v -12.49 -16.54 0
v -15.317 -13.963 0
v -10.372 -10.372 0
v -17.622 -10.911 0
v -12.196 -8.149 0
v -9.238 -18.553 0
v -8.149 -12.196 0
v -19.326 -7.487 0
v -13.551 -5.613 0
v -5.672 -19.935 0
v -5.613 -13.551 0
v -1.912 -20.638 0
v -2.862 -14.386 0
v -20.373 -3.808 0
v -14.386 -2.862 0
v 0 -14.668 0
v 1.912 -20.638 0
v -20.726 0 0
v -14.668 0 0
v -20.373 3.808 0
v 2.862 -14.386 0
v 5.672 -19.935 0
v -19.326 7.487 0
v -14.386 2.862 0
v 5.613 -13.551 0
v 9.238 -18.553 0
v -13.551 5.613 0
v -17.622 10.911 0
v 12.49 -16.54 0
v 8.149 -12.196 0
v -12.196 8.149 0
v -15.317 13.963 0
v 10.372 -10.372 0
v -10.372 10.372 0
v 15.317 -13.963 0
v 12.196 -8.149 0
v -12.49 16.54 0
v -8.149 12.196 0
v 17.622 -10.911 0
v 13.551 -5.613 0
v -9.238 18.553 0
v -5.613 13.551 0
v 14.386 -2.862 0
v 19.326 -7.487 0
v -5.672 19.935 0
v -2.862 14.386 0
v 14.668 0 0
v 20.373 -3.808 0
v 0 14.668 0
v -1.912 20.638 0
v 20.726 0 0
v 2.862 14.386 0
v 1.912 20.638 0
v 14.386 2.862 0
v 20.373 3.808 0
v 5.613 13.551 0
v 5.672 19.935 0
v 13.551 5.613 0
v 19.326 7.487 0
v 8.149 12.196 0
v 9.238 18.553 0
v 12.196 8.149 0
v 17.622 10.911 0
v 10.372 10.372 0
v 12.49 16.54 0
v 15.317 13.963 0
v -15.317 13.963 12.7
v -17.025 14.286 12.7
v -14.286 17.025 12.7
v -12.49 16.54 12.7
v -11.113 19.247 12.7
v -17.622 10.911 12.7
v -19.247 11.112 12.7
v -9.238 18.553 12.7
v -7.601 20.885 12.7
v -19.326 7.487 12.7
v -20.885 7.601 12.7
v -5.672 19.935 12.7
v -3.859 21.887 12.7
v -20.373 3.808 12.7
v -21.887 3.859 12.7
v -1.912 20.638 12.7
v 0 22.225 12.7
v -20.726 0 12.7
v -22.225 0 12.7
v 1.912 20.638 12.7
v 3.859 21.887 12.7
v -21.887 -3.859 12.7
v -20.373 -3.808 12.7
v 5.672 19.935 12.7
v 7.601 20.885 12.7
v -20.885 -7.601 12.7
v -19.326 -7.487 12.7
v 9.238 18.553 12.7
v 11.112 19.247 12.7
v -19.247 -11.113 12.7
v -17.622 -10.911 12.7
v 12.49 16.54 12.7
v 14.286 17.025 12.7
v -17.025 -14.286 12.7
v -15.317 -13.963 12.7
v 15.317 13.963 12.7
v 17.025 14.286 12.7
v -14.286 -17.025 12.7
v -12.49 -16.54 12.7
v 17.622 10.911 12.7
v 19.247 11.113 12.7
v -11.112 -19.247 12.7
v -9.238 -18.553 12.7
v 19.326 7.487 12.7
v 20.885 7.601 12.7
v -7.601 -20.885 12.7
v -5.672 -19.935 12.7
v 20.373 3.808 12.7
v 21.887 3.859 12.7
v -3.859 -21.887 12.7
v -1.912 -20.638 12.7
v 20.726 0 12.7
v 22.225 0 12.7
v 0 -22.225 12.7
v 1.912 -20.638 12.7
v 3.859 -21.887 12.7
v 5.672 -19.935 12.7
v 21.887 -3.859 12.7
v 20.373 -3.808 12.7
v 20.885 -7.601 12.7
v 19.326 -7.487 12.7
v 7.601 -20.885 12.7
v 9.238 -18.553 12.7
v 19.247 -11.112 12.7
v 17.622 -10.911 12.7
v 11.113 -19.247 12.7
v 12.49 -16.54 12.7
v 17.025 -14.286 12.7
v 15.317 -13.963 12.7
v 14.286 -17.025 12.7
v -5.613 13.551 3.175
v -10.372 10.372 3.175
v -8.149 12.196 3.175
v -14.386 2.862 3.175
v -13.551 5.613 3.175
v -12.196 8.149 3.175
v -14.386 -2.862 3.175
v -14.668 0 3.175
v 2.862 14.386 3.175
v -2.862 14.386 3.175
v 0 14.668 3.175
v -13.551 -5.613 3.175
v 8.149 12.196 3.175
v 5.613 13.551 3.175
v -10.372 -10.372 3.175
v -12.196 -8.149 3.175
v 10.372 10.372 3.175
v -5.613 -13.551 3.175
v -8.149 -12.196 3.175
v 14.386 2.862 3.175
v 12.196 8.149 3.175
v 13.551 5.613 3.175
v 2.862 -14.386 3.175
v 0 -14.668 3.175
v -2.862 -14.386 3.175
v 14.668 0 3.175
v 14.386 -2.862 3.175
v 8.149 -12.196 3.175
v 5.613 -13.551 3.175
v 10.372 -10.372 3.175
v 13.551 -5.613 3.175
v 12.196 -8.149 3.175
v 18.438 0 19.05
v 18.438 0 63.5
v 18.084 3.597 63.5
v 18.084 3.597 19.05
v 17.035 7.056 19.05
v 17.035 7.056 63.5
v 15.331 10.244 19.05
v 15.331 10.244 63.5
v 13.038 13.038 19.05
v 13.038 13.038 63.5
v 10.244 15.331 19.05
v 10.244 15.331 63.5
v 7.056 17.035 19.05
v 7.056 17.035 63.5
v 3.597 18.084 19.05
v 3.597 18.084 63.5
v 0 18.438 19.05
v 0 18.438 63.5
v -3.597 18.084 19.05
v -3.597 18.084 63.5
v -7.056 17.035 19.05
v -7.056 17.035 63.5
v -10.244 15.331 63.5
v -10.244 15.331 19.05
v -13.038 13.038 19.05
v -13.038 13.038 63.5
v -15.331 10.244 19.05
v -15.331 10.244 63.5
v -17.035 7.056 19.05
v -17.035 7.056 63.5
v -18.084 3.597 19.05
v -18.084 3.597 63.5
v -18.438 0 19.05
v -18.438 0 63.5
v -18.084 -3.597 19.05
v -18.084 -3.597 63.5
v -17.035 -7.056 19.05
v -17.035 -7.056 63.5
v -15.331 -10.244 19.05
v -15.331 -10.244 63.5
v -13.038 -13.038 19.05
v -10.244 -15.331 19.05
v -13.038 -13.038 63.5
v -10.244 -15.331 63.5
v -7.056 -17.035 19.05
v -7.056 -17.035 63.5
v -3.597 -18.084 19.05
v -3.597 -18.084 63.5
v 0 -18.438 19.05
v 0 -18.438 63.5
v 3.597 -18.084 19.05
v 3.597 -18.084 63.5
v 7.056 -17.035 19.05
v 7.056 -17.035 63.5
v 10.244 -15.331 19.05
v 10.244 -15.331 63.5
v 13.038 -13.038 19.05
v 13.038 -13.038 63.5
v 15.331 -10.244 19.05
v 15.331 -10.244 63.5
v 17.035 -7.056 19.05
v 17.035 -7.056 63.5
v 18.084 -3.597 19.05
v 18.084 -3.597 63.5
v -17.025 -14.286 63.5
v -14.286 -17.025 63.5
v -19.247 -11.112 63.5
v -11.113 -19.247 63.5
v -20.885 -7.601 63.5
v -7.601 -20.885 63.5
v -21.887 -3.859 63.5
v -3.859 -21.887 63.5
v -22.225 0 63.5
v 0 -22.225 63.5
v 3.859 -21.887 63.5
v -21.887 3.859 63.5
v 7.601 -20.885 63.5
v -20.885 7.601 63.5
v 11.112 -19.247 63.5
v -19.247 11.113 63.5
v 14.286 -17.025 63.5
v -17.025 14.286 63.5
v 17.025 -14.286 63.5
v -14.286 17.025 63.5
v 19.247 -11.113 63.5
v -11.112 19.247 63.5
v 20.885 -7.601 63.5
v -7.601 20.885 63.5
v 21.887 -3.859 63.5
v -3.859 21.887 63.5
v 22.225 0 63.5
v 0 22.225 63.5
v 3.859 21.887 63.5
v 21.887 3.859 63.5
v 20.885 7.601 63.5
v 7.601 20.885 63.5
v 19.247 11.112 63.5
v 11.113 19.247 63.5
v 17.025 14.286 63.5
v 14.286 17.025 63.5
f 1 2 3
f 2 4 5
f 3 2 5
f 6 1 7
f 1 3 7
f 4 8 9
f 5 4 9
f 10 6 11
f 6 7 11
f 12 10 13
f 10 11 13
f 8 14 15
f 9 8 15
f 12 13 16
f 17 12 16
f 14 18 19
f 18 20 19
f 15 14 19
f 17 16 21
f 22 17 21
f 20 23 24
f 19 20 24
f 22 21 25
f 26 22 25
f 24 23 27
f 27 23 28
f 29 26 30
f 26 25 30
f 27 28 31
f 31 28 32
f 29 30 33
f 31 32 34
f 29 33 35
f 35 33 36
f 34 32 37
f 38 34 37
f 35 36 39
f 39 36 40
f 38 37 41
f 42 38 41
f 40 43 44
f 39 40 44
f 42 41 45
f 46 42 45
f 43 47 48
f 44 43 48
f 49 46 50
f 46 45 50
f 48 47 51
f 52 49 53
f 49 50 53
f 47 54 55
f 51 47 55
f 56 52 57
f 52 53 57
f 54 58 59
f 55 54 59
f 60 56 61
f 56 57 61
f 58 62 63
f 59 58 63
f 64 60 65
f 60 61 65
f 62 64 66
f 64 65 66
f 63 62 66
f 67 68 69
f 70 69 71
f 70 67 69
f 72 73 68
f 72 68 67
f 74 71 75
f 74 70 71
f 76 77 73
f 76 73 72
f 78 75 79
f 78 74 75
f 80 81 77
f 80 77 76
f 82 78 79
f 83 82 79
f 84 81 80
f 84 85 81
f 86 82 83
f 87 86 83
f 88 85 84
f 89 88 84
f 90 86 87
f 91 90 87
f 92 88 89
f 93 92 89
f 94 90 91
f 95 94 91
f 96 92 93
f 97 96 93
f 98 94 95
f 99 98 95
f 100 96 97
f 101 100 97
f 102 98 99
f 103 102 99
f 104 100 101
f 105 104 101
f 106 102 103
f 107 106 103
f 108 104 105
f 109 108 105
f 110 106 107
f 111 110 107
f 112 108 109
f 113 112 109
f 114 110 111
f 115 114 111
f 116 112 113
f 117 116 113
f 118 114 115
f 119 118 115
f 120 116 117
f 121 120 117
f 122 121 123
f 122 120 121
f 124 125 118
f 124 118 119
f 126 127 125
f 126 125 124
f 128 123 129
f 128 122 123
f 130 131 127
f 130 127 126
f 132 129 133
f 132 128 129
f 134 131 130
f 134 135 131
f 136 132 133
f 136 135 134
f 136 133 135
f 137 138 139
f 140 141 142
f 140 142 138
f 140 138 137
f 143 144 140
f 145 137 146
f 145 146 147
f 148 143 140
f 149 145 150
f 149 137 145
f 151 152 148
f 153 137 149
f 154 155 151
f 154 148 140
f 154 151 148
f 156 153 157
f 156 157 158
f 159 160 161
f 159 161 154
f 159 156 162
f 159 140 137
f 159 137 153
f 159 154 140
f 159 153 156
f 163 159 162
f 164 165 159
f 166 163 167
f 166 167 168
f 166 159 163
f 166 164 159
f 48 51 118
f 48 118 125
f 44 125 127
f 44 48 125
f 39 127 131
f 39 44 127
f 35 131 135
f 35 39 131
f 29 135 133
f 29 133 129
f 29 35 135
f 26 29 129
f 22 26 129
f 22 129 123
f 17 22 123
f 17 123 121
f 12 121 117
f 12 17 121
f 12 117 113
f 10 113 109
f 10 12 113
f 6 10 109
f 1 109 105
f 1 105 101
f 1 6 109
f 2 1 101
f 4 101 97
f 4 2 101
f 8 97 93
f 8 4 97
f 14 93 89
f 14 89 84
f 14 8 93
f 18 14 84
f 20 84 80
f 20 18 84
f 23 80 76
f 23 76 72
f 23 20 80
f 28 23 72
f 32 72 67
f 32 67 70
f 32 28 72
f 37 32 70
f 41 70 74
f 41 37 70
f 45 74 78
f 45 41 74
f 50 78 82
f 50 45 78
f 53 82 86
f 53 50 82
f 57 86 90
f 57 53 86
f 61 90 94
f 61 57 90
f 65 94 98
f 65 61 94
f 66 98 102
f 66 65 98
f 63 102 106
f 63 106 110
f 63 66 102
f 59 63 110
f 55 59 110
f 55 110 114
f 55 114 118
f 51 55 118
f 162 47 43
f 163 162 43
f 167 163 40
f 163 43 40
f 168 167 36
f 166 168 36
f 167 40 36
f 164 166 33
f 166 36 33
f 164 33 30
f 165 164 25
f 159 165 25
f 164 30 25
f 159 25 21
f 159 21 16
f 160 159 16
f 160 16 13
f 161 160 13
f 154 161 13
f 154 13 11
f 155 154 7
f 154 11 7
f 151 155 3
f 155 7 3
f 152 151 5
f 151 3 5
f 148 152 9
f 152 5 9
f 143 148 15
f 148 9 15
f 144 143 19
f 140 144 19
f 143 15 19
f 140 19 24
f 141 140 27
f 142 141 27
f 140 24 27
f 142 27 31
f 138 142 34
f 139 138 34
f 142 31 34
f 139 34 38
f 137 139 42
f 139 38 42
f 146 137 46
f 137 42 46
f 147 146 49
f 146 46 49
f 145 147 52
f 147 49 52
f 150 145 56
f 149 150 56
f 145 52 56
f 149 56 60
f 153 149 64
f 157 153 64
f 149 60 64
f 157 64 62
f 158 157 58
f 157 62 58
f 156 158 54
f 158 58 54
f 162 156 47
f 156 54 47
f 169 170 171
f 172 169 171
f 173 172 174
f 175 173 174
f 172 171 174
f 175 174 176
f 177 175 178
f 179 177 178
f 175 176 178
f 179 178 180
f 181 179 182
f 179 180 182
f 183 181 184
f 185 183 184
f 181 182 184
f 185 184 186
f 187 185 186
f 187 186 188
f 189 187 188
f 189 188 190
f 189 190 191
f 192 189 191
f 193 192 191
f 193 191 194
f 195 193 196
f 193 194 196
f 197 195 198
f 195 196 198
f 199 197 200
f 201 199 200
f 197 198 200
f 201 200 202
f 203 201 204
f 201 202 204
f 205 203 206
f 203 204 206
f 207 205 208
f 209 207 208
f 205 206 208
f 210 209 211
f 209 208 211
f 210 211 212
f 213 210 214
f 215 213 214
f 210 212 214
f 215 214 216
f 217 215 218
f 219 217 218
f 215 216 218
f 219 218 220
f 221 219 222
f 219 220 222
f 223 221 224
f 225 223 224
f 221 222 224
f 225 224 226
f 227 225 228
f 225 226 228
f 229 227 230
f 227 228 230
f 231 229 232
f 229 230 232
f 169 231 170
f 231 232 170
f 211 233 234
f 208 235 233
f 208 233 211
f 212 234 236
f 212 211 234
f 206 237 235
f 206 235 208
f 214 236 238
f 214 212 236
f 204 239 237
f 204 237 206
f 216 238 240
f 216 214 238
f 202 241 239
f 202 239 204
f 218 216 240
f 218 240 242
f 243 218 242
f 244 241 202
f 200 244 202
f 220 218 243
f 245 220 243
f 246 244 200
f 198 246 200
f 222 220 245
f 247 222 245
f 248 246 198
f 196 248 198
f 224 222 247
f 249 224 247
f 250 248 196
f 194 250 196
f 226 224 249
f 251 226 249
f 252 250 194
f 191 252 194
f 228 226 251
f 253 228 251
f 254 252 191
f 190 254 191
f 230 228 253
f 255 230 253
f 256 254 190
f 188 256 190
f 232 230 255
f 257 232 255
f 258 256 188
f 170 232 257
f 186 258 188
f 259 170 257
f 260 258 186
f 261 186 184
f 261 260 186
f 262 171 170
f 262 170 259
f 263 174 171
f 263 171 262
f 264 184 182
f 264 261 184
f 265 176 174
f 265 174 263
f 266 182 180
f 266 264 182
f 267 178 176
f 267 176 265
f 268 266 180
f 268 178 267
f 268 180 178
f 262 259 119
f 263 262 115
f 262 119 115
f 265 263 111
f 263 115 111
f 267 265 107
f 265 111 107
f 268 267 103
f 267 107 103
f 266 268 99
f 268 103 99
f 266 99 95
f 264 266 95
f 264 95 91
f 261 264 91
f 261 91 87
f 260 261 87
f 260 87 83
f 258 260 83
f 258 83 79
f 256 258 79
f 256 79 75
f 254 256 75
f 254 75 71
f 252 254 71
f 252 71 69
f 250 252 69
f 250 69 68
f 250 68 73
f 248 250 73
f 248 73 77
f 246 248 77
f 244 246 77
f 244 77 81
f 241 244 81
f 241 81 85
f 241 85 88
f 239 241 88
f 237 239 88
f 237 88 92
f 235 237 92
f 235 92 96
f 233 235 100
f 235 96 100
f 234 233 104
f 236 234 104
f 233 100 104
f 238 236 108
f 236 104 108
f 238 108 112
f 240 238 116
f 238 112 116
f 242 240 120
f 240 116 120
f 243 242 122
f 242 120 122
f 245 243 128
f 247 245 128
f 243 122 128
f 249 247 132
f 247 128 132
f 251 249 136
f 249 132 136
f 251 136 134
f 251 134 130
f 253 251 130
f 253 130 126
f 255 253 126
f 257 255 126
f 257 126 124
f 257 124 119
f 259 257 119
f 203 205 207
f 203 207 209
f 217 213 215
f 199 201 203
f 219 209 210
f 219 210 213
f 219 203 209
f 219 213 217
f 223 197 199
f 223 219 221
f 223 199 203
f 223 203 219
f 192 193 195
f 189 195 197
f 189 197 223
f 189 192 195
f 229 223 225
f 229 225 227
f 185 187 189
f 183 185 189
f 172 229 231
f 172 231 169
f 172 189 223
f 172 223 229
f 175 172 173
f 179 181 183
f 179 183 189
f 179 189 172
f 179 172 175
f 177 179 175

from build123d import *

# Parameters (mm, degrees)
F0_R        = 22.225
F1_DEPTH    = 63.5
F2_R        = 18.4381673654
F3_DEPTH    = 44.45
F4_R        = 22.225
F4_R_2      = 20.7260281568
F5_DEPTH    = 12.7
F6_R        = 14.6680324841
F1_FACE_R   = 22.225
F1_FACE_R_2 = 18.4381673654
F7_DEPTH    = 3.175


with BuildPart() as f1:
    # F0 (on Top) → F1 (new body)
    with BuildSketch(Plane.XY):
        Circle(F0_R)
    extrude(amount=F1_DEPTH)

    # F2 (on face) → F3 (cut)
    with BuildSketch(Plane.XY.offset(63.5)):
        Circle(F2_R)
    extrude(amount=-F3_DEPTH, mode=Mode.SUBTRACT)

    # F4 (on face) → F5 (cut)
    with BuildSketch(Plane(origin=(0, 0, 0), x_dir=(1, 0, 0), z_dir=(0, 0, -1))):
        Circle(F4_R)
        Circle(F4_R_2, mode=Mode.SUBTRACT)
    extrude(amount=-F5_DEPTH, mode=Mode.SUBTRACT)

    # F6 (on face) + F1_face (on face) → F7 (cut)
    with BuildSketch(Plane(origin=(0, 0, 0), x_dir=(1, 0, 0), z_dir=(0, 0, -1))):
        Circle(F6_R)
    with BuildSketch(Plane.XY.offset(63.5)):
        Circle(F1_FACE_R)
        Circle(F1_FACE_R_2, mode=Mode.SUBTRACT)
    extrude(amount=-F7_DEPTH, dir=(0, 0, -1), mode=Mode.SUBTRACT)


solid = f1.part
